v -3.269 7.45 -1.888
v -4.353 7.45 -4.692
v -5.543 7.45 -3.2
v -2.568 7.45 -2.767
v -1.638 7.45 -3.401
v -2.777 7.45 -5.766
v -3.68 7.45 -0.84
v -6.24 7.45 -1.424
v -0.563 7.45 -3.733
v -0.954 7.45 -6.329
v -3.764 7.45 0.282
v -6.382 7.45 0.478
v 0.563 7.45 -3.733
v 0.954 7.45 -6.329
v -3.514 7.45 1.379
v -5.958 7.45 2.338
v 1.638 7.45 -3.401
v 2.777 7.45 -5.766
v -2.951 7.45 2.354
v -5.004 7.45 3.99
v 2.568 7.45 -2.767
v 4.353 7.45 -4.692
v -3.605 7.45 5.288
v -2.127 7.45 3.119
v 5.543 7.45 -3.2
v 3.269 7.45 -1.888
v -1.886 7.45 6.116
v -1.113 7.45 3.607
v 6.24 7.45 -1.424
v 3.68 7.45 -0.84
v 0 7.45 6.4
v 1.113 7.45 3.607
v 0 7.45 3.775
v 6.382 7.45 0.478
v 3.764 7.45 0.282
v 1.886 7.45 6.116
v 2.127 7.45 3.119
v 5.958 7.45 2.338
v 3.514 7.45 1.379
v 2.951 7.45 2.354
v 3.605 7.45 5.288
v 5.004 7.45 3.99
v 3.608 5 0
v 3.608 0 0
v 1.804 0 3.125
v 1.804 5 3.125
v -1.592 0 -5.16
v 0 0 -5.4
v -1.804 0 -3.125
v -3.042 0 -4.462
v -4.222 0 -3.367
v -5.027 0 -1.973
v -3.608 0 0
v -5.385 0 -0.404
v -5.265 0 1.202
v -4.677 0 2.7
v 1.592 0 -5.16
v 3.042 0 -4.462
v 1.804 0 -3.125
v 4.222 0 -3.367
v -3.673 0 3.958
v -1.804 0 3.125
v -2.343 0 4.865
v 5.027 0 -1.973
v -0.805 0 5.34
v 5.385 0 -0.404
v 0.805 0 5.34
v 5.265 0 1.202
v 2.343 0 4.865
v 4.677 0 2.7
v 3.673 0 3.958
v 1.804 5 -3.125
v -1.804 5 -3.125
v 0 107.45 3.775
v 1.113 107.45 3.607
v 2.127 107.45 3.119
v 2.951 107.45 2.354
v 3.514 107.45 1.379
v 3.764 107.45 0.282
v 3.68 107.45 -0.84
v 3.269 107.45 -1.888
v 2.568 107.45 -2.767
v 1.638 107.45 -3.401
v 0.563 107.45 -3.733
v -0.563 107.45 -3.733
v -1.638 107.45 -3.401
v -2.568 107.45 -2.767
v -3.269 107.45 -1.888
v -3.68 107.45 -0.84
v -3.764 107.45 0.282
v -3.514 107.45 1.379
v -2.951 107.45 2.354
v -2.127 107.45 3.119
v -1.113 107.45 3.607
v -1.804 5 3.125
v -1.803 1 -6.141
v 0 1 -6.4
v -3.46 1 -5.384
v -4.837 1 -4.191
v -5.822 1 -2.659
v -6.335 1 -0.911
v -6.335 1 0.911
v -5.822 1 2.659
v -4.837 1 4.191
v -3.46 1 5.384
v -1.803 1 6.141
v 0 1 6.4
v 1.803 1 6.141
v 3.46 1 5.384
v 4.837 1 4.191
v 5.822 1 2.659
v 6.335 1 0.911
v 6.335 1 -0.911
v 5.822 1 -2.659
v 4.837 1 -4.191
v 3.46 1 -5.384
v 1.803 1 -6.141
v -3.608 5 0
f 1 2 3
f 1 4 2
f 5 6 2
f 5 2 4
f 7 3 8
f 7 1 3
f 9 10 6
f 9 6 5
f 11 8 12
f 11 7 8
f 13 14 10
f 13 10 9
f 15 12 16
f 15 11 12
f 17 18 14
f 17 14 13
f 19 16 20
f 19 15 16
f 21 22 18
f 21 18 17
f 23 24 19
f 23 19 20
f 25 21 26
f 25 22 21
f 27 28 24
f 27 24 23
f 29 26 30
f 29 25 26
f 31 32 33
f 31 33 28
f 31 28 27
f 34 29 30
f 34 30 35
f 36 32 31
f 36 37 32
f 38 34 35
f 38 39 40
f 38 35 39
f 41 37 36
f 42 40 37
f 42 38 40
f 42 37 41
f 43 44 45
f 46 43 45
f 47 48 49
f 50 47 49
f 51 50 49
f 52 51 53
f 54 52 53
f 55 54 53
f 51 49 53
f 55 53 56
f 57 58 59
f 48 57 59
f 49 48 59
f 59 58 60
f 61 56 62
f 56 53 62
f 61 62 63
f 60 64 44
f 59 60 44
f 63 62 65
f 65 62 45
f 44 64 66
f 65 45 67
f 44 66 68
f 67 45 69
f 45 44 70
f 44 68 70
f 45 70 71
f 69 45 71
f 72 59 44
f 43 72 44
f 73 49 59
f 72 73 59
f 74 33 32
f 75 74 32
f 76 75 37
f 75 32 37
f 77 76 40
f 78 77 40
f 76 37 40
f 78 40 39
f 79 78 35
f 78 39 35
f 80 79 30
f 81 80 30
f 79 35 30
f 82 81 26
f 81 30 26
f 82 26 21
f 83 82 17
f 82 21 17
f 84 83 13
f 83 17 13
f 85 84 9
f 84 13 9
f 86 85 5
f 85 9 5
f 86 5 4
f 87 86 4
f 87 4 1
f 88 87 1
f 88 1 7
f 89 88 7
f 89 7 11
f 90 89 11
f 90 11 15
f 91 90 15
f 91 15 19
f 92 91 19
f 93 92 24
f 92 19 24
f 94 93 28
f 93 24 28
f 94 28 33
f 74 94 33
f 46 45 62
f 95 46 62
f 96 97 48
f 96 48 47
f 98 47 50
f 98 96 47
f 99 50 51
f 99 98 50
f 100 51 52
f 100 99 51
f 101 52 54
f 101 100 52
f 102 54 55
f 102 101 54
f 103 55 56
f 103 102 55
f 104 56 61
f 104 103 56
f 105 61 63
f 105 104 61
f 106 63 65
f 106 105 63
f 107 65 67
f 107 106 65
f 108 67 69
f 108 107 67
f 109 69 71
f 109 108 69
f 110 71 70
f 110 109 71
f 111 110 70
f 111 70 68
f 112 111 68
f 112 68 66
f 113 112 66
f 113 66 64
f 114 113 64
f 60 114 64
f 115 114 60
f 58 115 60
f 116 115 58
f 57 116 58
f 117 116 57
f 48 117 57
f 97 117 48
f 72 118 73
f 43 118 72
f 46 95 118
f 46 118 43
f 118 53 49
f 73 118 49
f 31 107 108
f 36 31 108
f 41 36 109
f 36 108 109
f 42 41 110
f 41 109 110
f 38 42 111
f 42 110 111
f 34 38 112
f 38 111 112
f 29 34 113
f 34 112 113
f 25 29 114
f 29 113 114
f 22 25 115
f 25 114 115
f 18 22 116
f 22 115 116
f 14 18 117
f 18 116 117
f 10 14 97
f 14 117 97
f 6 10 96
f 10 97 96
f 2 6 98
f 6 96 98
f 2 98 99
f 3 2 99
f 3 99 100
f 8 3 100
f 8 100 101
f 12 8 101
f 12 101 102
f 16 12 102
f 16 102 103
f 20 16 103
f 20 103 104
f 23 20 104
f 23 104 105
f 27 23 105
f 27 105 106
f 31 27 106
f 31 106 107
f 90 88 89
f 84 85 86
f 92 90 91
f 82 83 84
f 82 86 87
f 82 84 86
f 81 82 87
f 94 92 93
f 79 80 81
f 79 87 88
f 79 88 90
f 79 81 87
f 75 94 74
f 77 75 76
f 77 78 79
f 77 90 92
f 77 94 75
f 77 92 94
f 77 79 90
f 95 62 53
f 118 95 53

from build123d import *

# Parameters (mm, degrees)
SKETCH1_R           = 6.4
BOSS_EXTRUDE1_DEPTH = 7.45
SKETCH2_R           = 3.775
BOSS_EXTRUDE2_DEPTH = 100
CUT_EXTRUDE1_DEPTH  = 5


with BuildPart() as part:
    # Sketch1 → Boss-Extrude1 (new body)
    with BuildSketch(Plane(origin=(0, 0, 0), x_dir=(1, 0, 0), z_dir=(0, 1, 0))):
        with Locations(Location((0, 0, 0), (0, 0, 270))):
            Circle(SKETCH1_R)
    extrude(amount=BOSS_EXTRUDE1_DEPTH)

    # Sketch2 → Boss-Extrude2 (add)
    with BuildSketch(Plane(origin=(0, 7.45, 0), x_dir=(1, 0, 0), z_dir=(0, 1, 0))):
        with Locations(Location((0, 0, 0), (0, 0, 270))):
            Circle(SKETCH2_R)
    extrude(amount=BOSS_EXTRUDE2_DEPTH)

    # Sketch3 → Cut-Extrude1 (cut)
    with BuildSketch(Plane.XZ):
        Polygon((-3.608439182, 0), (-1.804219591, -3.125), (1.804219591, -3.125), (3.608439182, 0), (1.804219591, 3.125), (-1.804219591, 3.125), align=None)
    extrude(amount=-CUT_EXTRUDE1_DEPTH, mode=Mode.SUBTRACT)

    # Sketch4 → Cut-Revolve1 (revolve, cut)
    with BuildSketch(Plane(origin=(0, 0, 0), x_dir=(0, 0, -1), z_dir=(1, 0, 0))):
        Polygon((5.4, 0), (6.4, 1), (6.4, 0), align=None)
    revolve(axis=Axis((0, 0, 0), (0, 1, 0)), mode=Mode.SUBTRACT)


solid = part.part
